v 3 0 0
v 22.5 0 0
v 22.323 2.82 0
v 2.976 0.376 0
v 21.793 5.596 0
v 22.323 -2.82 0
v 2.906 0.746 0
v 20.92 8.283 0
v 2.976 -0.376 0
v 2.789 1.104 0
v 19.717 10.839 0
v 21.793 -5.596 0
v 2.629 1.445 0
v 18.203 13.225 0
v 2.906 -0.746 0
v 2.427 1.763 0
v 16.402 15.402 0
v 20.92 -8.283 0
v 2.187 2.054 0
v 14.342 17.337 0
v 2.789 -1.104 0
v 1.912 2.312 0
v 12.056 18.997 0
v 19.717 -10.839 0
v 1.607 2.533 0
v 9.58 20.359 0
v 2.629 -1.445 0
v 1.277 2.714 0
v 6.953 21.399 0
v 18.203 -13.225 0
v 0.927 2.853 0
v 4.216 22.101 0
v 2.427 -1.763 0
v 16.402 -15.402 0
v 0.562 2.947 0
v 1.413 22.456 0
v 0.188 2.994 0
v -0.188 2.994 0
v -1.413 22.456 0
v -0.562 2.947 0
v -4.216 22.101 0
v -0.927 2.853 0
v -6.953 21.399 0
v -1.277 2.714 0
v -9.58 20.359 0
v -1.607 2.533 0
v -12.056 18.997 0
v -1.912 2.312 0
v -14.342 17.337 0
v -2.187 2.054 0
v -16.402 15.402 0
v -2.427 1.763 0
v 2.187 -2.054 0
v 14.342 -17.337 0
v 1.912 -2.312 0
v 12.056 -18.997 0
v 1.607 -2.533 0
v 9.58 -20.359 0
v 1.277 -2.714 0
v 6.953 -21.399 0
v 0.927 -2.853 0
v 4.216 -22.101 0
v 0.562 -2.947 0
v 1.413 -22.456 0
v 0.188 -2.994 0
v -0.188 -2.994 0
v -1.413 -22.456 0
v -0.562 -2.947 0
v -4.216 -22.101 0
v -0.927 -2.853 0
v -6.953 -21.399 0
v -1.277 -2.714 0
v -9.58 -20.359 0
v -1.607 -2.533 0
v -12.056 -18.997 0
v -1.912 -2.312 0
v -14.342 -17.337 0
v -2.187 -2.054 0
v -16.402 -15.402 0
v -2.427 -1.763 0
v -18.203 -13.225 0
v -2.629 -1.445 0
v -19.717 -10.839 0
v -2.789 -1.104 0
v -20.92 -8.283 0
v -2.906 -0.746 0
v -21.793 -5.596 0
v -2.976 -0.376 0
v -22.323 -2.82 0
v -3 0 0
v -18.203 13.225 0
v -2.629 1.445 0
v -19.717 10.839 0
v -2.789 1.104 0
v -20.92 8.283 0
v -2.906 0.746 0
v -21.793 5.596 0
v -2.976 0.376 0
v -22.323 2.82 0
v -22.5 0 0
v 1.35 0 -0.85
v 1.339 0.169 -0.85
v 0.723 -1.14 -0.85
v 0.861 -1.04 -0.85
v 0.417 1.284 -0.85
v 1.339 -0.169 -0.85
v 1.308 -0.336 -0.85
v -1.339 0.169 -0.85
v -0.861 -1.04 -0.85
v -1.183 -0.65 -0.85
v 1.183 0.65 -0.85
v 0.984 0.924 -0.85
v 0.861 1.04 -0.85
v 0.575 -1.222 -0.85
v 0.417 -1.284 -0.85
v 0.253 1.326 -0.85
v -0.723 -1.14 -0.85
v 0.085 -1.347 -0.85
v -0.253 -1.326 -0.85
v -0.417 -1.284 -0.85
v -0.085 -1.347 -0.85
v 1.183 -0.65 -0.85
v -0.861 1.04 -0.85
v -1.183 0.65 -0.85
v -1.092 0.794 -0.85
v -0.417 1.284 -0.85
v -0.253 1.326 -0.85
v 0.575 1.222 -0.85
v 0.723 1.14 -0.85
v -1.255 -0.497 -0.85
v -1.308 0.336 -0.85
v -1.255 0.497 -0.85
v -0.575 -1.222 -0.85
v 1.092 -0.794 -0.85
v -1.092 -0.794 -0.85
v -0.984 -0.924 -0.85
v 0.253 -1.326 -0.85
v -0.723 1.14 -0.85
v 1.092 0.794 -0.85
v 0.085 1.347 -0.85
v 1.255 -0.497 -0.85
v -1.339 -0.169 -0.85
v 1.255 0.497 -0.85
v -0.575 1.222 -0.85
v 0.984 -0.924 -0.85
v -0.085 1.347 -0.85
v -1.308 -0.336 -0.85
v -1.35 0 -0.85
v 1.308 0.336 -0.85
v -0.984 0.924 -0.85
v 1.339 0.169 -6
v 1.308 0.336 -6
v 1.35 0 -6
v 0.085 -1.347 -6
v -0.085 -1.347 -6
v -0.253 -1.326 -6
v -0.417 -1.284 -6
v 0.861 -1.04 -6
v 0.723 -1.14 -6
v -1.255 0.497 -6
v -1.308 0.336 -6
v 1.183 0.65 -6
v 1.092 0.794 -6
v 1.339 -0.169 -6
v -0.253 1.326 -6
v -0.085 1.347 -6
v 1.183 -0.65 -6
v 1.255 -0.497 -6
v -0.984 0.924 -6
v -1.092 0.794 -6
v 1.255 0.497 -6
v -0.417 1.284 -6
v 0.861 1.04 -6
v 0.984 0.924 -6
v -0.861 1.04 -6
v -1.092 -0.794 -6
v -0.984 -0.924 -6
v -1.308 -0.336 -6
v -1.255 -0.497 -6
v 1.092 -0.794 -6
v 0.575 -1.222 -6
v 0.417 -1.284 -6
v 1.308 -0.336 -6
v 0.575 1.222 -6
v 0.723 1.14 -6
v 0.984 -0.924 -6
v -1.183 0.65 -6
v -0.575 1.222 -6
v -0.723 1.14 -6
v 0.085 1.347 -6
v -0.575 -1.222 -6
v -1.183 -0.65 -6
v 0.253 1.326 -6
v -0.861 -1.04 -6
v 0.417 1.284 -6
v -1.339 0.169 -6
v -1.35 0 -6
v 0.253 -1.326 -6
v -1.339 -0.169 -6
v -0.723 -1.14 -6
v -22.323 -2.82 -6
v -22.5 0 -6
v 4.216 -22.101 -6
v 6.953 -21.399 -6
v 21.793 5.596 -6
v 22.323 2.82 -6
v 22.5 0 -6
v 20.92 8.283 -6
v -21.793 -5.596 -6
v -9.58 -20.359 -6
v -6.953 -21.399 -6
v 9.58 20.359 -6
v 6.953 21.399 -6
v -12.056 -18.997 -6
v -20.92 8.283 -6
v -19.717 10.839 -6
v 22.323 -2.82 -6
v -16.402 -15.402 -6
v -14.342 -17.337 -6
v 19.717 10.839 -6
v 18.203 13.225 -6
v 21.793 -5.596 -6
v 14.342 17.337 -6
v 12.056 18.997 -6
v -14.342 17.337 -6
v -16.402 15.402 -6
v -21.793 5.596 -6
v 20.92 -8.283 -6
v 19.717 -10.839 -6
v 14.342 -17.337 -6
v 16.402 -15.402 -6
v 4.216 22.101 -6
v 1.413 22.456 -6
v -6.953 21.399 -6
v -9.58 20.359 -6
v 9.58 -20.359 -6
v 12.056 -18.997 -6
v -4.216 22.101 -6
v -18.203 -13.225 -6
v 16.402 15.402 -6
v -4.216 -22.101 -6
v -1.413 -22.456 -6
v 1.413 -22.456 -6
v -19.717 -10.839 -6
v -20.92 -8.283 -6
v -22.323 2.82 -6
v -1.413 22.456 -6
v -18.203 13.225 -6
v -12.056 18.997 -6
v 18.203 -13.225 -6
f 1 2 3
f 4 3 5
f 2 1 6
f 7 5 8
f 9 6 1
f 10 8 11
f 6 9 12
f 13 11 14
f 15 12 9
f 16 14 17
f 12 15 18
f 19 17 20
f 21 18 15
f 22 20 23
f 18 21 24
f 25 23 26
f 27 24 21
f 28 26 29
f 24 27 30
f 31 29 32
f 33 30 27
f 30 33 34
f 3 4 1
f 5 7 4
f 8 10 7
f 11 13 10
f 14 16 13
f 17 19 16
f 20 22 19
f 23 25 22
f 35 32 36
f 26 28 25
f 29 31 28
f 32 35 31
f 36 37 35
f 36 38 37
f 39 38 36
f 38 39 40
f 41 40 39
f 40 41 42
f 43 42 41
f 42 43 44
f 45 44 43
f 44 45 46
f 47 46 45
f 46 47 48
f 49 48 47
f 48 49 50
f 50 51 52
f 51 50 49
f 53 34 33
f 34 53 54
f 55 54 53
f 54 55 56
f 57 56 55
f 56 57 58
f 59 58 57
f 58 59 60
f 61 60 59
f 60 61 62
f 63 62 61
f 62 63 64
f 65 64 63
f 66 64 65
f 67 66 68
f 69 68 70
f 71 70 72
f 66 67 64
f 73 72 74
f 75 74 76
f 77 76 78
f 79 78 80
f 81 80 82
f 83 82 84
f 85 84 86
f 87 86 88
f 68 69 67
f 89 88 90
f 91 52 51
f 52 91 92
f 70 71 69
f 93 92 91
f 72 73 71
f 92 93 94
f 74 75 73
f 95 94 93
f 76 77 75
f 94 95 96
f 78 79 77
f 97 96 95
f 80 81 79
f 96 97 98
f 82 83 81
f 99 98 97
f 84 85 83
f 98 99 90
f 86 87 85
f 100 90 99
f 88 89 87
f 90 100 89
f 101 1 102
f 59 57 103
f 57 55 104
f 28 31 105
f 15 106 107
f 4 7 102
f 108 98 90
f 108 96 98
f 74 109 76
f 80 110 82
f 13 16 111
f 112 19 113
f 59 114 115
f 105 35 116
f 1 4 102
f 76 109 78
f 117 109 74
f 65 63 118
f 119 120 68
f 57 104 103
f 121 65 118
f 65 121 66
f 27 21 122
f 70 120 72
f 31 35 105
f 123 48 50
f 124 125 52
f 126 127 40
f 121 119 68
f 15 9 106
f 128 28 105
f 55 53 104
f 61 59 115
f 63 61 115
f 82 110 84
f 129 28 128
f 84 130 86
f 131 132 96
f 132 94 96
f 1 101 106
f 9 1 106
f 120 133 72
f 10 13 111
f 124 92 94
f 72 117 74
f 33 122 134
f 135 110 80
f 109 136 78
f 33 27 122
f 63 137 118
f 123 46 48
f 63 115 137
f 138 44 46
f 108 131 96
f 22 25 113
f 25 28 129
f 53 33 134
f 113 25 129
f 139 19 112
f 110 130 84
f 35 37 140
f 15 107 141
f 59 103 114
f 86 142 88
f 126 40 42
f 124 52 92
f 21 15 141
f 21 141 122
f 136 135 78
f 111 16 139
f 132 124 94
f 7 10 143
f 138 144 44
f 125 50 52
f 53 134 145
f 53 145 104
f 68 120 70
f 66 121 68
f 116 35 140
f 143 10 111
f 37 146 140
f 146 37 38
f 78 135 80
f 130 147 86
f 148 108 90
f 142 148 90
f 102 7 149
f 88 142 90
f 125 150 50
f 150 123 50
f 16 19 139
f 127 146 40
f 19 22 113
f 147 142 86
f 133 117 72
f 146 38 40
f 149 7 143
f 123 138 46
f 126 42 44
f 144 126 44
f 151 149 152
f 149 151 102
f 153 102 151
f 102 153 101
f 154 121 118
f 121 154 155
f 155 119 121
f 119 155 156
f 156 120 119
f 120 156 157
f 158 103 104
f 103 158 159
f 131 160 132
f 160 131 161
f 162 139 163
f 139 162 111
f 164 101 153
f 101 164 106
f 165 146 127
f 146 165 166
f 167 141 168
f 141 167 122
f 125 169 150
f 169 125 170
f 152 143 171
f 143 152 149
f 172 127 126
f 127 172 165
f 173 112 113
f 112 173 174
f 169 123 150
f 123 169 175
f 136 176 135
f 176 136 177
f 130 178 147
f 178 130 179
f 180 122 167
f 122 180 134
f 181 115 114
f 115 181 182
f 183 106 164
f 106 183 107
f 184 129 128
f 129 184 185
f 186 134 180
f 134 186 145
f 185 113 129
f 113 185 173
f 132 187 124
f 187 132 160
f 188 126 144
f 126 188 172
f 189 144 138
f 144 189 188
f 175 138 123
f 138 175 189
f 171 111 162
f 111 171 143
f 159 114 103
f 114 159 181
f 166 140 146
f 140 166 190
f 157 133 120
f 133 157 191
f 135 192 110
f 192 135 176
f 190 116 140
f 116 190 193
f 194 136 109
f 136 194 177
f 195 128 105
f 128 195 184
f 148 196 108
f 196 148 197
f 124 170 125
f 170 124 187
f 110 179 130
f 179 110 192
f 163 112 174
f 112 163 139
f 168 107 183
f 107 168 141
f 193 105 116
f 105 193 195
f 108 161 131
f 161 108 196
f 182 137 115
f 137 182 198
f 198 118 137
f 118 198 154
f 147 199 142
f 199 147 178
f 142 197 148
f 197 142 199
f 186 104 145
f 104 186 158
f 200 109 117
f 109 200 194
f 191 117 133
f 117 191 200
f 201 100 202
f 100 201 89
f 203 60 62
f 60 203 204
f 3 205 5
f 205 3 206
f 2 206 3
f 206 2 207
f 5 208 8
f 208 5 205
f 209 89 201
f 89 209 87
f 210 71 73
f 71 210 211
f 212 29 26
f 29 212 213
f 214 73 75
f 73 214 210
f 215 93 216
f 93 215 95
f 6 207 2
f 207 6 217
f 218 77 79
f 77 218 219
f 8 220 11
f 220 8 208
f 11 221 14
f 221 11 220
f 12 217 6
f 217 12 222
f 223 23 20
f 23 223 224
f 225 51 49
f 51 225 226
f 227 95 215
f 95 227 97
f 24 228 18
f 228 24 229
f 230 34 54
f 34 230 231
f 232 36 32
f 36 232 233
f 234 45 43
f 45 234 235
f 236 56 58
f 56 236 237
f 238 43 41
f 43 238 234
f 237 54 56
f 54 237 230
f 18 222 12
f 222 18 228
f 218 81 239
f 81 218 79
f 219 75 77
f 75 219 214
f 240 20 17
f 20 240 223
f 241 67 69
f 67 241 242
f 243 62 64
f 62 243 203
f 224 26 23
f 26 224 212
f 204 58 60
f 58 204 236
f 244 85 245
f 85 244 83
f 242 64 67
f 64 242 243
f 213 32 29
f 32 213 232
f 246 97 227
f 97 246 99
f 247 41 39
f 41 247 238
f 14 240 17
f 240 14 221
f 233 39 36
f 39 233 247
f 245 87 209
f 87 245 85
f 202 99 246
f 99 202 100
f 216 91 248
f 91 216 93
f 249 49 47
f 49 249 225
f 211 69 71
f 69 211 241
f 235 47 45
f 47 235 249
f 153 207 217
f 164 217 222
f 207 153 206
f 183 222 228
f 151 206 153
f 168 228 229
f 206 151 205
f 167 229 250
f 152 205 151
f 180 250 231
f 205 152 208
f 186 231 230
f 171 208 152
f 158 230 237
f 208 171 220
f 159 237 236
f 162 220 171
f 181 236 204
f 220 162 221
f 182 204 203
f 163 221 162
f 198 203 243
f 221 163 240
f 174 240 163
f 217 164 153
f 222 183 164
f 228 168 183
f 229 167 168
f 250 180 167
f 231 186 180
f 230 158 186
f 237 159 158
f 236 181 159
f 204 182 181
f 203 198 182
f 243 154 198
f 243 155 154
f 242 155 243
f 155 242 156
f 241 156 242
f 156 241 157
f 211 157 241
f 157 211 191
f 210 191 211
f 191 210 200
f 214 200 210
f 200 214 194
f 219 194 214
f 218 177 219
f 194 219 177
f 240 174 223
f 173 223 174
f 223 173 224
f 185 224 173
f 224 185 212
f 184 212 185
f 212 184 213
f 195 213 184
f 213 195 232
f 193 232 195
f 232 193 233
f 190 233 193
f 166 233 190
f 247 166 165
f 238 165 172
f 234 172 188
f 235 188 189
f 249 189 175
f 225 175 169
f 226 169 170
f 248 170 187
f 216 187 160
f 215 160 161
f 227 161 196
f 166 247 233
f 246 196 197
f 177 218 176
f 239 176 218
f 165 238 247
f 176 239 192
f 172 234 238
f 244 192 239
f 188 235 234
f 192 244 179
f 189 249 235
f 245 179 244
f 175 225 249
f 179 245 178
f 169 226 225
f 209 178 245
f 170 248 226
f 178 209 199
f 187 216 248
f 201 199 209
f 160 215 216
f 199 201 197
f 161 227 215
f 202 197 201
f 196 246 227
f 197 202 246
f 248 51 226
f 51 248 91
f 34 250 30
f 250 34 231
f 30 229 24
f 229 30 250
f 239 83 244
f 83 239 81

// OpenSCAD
$fn = 50;

difference() {
	union() {
		translate(v = [0, 0, -6.0]) {
			cylinder(h = 6, r = 22.5);
		}
	}
	union() {
		translate(v = [0, 0, 0]) {
			rotate(a = [0, 0, 0]) {
				difference() {
					union() {
						translate(v = [0, 0, -9.0]) {
							cylinder(h = 9, r = 1.0);
						}
						translate(v = [0, 0, -0.85]) {
							cylinder(h = 0.85, r1 = 1.35, r2 = 3.0);
						}
						translate(v = [0, 0, -9.0]) {
							cylinder(h = 9, r = 1.35);
						}
						translate(v = [0, 0, -9.0]) {
							cylinder(h = 9, r = 1.0);
						}
					}
					union();
				}
			}
		}
	}
}
